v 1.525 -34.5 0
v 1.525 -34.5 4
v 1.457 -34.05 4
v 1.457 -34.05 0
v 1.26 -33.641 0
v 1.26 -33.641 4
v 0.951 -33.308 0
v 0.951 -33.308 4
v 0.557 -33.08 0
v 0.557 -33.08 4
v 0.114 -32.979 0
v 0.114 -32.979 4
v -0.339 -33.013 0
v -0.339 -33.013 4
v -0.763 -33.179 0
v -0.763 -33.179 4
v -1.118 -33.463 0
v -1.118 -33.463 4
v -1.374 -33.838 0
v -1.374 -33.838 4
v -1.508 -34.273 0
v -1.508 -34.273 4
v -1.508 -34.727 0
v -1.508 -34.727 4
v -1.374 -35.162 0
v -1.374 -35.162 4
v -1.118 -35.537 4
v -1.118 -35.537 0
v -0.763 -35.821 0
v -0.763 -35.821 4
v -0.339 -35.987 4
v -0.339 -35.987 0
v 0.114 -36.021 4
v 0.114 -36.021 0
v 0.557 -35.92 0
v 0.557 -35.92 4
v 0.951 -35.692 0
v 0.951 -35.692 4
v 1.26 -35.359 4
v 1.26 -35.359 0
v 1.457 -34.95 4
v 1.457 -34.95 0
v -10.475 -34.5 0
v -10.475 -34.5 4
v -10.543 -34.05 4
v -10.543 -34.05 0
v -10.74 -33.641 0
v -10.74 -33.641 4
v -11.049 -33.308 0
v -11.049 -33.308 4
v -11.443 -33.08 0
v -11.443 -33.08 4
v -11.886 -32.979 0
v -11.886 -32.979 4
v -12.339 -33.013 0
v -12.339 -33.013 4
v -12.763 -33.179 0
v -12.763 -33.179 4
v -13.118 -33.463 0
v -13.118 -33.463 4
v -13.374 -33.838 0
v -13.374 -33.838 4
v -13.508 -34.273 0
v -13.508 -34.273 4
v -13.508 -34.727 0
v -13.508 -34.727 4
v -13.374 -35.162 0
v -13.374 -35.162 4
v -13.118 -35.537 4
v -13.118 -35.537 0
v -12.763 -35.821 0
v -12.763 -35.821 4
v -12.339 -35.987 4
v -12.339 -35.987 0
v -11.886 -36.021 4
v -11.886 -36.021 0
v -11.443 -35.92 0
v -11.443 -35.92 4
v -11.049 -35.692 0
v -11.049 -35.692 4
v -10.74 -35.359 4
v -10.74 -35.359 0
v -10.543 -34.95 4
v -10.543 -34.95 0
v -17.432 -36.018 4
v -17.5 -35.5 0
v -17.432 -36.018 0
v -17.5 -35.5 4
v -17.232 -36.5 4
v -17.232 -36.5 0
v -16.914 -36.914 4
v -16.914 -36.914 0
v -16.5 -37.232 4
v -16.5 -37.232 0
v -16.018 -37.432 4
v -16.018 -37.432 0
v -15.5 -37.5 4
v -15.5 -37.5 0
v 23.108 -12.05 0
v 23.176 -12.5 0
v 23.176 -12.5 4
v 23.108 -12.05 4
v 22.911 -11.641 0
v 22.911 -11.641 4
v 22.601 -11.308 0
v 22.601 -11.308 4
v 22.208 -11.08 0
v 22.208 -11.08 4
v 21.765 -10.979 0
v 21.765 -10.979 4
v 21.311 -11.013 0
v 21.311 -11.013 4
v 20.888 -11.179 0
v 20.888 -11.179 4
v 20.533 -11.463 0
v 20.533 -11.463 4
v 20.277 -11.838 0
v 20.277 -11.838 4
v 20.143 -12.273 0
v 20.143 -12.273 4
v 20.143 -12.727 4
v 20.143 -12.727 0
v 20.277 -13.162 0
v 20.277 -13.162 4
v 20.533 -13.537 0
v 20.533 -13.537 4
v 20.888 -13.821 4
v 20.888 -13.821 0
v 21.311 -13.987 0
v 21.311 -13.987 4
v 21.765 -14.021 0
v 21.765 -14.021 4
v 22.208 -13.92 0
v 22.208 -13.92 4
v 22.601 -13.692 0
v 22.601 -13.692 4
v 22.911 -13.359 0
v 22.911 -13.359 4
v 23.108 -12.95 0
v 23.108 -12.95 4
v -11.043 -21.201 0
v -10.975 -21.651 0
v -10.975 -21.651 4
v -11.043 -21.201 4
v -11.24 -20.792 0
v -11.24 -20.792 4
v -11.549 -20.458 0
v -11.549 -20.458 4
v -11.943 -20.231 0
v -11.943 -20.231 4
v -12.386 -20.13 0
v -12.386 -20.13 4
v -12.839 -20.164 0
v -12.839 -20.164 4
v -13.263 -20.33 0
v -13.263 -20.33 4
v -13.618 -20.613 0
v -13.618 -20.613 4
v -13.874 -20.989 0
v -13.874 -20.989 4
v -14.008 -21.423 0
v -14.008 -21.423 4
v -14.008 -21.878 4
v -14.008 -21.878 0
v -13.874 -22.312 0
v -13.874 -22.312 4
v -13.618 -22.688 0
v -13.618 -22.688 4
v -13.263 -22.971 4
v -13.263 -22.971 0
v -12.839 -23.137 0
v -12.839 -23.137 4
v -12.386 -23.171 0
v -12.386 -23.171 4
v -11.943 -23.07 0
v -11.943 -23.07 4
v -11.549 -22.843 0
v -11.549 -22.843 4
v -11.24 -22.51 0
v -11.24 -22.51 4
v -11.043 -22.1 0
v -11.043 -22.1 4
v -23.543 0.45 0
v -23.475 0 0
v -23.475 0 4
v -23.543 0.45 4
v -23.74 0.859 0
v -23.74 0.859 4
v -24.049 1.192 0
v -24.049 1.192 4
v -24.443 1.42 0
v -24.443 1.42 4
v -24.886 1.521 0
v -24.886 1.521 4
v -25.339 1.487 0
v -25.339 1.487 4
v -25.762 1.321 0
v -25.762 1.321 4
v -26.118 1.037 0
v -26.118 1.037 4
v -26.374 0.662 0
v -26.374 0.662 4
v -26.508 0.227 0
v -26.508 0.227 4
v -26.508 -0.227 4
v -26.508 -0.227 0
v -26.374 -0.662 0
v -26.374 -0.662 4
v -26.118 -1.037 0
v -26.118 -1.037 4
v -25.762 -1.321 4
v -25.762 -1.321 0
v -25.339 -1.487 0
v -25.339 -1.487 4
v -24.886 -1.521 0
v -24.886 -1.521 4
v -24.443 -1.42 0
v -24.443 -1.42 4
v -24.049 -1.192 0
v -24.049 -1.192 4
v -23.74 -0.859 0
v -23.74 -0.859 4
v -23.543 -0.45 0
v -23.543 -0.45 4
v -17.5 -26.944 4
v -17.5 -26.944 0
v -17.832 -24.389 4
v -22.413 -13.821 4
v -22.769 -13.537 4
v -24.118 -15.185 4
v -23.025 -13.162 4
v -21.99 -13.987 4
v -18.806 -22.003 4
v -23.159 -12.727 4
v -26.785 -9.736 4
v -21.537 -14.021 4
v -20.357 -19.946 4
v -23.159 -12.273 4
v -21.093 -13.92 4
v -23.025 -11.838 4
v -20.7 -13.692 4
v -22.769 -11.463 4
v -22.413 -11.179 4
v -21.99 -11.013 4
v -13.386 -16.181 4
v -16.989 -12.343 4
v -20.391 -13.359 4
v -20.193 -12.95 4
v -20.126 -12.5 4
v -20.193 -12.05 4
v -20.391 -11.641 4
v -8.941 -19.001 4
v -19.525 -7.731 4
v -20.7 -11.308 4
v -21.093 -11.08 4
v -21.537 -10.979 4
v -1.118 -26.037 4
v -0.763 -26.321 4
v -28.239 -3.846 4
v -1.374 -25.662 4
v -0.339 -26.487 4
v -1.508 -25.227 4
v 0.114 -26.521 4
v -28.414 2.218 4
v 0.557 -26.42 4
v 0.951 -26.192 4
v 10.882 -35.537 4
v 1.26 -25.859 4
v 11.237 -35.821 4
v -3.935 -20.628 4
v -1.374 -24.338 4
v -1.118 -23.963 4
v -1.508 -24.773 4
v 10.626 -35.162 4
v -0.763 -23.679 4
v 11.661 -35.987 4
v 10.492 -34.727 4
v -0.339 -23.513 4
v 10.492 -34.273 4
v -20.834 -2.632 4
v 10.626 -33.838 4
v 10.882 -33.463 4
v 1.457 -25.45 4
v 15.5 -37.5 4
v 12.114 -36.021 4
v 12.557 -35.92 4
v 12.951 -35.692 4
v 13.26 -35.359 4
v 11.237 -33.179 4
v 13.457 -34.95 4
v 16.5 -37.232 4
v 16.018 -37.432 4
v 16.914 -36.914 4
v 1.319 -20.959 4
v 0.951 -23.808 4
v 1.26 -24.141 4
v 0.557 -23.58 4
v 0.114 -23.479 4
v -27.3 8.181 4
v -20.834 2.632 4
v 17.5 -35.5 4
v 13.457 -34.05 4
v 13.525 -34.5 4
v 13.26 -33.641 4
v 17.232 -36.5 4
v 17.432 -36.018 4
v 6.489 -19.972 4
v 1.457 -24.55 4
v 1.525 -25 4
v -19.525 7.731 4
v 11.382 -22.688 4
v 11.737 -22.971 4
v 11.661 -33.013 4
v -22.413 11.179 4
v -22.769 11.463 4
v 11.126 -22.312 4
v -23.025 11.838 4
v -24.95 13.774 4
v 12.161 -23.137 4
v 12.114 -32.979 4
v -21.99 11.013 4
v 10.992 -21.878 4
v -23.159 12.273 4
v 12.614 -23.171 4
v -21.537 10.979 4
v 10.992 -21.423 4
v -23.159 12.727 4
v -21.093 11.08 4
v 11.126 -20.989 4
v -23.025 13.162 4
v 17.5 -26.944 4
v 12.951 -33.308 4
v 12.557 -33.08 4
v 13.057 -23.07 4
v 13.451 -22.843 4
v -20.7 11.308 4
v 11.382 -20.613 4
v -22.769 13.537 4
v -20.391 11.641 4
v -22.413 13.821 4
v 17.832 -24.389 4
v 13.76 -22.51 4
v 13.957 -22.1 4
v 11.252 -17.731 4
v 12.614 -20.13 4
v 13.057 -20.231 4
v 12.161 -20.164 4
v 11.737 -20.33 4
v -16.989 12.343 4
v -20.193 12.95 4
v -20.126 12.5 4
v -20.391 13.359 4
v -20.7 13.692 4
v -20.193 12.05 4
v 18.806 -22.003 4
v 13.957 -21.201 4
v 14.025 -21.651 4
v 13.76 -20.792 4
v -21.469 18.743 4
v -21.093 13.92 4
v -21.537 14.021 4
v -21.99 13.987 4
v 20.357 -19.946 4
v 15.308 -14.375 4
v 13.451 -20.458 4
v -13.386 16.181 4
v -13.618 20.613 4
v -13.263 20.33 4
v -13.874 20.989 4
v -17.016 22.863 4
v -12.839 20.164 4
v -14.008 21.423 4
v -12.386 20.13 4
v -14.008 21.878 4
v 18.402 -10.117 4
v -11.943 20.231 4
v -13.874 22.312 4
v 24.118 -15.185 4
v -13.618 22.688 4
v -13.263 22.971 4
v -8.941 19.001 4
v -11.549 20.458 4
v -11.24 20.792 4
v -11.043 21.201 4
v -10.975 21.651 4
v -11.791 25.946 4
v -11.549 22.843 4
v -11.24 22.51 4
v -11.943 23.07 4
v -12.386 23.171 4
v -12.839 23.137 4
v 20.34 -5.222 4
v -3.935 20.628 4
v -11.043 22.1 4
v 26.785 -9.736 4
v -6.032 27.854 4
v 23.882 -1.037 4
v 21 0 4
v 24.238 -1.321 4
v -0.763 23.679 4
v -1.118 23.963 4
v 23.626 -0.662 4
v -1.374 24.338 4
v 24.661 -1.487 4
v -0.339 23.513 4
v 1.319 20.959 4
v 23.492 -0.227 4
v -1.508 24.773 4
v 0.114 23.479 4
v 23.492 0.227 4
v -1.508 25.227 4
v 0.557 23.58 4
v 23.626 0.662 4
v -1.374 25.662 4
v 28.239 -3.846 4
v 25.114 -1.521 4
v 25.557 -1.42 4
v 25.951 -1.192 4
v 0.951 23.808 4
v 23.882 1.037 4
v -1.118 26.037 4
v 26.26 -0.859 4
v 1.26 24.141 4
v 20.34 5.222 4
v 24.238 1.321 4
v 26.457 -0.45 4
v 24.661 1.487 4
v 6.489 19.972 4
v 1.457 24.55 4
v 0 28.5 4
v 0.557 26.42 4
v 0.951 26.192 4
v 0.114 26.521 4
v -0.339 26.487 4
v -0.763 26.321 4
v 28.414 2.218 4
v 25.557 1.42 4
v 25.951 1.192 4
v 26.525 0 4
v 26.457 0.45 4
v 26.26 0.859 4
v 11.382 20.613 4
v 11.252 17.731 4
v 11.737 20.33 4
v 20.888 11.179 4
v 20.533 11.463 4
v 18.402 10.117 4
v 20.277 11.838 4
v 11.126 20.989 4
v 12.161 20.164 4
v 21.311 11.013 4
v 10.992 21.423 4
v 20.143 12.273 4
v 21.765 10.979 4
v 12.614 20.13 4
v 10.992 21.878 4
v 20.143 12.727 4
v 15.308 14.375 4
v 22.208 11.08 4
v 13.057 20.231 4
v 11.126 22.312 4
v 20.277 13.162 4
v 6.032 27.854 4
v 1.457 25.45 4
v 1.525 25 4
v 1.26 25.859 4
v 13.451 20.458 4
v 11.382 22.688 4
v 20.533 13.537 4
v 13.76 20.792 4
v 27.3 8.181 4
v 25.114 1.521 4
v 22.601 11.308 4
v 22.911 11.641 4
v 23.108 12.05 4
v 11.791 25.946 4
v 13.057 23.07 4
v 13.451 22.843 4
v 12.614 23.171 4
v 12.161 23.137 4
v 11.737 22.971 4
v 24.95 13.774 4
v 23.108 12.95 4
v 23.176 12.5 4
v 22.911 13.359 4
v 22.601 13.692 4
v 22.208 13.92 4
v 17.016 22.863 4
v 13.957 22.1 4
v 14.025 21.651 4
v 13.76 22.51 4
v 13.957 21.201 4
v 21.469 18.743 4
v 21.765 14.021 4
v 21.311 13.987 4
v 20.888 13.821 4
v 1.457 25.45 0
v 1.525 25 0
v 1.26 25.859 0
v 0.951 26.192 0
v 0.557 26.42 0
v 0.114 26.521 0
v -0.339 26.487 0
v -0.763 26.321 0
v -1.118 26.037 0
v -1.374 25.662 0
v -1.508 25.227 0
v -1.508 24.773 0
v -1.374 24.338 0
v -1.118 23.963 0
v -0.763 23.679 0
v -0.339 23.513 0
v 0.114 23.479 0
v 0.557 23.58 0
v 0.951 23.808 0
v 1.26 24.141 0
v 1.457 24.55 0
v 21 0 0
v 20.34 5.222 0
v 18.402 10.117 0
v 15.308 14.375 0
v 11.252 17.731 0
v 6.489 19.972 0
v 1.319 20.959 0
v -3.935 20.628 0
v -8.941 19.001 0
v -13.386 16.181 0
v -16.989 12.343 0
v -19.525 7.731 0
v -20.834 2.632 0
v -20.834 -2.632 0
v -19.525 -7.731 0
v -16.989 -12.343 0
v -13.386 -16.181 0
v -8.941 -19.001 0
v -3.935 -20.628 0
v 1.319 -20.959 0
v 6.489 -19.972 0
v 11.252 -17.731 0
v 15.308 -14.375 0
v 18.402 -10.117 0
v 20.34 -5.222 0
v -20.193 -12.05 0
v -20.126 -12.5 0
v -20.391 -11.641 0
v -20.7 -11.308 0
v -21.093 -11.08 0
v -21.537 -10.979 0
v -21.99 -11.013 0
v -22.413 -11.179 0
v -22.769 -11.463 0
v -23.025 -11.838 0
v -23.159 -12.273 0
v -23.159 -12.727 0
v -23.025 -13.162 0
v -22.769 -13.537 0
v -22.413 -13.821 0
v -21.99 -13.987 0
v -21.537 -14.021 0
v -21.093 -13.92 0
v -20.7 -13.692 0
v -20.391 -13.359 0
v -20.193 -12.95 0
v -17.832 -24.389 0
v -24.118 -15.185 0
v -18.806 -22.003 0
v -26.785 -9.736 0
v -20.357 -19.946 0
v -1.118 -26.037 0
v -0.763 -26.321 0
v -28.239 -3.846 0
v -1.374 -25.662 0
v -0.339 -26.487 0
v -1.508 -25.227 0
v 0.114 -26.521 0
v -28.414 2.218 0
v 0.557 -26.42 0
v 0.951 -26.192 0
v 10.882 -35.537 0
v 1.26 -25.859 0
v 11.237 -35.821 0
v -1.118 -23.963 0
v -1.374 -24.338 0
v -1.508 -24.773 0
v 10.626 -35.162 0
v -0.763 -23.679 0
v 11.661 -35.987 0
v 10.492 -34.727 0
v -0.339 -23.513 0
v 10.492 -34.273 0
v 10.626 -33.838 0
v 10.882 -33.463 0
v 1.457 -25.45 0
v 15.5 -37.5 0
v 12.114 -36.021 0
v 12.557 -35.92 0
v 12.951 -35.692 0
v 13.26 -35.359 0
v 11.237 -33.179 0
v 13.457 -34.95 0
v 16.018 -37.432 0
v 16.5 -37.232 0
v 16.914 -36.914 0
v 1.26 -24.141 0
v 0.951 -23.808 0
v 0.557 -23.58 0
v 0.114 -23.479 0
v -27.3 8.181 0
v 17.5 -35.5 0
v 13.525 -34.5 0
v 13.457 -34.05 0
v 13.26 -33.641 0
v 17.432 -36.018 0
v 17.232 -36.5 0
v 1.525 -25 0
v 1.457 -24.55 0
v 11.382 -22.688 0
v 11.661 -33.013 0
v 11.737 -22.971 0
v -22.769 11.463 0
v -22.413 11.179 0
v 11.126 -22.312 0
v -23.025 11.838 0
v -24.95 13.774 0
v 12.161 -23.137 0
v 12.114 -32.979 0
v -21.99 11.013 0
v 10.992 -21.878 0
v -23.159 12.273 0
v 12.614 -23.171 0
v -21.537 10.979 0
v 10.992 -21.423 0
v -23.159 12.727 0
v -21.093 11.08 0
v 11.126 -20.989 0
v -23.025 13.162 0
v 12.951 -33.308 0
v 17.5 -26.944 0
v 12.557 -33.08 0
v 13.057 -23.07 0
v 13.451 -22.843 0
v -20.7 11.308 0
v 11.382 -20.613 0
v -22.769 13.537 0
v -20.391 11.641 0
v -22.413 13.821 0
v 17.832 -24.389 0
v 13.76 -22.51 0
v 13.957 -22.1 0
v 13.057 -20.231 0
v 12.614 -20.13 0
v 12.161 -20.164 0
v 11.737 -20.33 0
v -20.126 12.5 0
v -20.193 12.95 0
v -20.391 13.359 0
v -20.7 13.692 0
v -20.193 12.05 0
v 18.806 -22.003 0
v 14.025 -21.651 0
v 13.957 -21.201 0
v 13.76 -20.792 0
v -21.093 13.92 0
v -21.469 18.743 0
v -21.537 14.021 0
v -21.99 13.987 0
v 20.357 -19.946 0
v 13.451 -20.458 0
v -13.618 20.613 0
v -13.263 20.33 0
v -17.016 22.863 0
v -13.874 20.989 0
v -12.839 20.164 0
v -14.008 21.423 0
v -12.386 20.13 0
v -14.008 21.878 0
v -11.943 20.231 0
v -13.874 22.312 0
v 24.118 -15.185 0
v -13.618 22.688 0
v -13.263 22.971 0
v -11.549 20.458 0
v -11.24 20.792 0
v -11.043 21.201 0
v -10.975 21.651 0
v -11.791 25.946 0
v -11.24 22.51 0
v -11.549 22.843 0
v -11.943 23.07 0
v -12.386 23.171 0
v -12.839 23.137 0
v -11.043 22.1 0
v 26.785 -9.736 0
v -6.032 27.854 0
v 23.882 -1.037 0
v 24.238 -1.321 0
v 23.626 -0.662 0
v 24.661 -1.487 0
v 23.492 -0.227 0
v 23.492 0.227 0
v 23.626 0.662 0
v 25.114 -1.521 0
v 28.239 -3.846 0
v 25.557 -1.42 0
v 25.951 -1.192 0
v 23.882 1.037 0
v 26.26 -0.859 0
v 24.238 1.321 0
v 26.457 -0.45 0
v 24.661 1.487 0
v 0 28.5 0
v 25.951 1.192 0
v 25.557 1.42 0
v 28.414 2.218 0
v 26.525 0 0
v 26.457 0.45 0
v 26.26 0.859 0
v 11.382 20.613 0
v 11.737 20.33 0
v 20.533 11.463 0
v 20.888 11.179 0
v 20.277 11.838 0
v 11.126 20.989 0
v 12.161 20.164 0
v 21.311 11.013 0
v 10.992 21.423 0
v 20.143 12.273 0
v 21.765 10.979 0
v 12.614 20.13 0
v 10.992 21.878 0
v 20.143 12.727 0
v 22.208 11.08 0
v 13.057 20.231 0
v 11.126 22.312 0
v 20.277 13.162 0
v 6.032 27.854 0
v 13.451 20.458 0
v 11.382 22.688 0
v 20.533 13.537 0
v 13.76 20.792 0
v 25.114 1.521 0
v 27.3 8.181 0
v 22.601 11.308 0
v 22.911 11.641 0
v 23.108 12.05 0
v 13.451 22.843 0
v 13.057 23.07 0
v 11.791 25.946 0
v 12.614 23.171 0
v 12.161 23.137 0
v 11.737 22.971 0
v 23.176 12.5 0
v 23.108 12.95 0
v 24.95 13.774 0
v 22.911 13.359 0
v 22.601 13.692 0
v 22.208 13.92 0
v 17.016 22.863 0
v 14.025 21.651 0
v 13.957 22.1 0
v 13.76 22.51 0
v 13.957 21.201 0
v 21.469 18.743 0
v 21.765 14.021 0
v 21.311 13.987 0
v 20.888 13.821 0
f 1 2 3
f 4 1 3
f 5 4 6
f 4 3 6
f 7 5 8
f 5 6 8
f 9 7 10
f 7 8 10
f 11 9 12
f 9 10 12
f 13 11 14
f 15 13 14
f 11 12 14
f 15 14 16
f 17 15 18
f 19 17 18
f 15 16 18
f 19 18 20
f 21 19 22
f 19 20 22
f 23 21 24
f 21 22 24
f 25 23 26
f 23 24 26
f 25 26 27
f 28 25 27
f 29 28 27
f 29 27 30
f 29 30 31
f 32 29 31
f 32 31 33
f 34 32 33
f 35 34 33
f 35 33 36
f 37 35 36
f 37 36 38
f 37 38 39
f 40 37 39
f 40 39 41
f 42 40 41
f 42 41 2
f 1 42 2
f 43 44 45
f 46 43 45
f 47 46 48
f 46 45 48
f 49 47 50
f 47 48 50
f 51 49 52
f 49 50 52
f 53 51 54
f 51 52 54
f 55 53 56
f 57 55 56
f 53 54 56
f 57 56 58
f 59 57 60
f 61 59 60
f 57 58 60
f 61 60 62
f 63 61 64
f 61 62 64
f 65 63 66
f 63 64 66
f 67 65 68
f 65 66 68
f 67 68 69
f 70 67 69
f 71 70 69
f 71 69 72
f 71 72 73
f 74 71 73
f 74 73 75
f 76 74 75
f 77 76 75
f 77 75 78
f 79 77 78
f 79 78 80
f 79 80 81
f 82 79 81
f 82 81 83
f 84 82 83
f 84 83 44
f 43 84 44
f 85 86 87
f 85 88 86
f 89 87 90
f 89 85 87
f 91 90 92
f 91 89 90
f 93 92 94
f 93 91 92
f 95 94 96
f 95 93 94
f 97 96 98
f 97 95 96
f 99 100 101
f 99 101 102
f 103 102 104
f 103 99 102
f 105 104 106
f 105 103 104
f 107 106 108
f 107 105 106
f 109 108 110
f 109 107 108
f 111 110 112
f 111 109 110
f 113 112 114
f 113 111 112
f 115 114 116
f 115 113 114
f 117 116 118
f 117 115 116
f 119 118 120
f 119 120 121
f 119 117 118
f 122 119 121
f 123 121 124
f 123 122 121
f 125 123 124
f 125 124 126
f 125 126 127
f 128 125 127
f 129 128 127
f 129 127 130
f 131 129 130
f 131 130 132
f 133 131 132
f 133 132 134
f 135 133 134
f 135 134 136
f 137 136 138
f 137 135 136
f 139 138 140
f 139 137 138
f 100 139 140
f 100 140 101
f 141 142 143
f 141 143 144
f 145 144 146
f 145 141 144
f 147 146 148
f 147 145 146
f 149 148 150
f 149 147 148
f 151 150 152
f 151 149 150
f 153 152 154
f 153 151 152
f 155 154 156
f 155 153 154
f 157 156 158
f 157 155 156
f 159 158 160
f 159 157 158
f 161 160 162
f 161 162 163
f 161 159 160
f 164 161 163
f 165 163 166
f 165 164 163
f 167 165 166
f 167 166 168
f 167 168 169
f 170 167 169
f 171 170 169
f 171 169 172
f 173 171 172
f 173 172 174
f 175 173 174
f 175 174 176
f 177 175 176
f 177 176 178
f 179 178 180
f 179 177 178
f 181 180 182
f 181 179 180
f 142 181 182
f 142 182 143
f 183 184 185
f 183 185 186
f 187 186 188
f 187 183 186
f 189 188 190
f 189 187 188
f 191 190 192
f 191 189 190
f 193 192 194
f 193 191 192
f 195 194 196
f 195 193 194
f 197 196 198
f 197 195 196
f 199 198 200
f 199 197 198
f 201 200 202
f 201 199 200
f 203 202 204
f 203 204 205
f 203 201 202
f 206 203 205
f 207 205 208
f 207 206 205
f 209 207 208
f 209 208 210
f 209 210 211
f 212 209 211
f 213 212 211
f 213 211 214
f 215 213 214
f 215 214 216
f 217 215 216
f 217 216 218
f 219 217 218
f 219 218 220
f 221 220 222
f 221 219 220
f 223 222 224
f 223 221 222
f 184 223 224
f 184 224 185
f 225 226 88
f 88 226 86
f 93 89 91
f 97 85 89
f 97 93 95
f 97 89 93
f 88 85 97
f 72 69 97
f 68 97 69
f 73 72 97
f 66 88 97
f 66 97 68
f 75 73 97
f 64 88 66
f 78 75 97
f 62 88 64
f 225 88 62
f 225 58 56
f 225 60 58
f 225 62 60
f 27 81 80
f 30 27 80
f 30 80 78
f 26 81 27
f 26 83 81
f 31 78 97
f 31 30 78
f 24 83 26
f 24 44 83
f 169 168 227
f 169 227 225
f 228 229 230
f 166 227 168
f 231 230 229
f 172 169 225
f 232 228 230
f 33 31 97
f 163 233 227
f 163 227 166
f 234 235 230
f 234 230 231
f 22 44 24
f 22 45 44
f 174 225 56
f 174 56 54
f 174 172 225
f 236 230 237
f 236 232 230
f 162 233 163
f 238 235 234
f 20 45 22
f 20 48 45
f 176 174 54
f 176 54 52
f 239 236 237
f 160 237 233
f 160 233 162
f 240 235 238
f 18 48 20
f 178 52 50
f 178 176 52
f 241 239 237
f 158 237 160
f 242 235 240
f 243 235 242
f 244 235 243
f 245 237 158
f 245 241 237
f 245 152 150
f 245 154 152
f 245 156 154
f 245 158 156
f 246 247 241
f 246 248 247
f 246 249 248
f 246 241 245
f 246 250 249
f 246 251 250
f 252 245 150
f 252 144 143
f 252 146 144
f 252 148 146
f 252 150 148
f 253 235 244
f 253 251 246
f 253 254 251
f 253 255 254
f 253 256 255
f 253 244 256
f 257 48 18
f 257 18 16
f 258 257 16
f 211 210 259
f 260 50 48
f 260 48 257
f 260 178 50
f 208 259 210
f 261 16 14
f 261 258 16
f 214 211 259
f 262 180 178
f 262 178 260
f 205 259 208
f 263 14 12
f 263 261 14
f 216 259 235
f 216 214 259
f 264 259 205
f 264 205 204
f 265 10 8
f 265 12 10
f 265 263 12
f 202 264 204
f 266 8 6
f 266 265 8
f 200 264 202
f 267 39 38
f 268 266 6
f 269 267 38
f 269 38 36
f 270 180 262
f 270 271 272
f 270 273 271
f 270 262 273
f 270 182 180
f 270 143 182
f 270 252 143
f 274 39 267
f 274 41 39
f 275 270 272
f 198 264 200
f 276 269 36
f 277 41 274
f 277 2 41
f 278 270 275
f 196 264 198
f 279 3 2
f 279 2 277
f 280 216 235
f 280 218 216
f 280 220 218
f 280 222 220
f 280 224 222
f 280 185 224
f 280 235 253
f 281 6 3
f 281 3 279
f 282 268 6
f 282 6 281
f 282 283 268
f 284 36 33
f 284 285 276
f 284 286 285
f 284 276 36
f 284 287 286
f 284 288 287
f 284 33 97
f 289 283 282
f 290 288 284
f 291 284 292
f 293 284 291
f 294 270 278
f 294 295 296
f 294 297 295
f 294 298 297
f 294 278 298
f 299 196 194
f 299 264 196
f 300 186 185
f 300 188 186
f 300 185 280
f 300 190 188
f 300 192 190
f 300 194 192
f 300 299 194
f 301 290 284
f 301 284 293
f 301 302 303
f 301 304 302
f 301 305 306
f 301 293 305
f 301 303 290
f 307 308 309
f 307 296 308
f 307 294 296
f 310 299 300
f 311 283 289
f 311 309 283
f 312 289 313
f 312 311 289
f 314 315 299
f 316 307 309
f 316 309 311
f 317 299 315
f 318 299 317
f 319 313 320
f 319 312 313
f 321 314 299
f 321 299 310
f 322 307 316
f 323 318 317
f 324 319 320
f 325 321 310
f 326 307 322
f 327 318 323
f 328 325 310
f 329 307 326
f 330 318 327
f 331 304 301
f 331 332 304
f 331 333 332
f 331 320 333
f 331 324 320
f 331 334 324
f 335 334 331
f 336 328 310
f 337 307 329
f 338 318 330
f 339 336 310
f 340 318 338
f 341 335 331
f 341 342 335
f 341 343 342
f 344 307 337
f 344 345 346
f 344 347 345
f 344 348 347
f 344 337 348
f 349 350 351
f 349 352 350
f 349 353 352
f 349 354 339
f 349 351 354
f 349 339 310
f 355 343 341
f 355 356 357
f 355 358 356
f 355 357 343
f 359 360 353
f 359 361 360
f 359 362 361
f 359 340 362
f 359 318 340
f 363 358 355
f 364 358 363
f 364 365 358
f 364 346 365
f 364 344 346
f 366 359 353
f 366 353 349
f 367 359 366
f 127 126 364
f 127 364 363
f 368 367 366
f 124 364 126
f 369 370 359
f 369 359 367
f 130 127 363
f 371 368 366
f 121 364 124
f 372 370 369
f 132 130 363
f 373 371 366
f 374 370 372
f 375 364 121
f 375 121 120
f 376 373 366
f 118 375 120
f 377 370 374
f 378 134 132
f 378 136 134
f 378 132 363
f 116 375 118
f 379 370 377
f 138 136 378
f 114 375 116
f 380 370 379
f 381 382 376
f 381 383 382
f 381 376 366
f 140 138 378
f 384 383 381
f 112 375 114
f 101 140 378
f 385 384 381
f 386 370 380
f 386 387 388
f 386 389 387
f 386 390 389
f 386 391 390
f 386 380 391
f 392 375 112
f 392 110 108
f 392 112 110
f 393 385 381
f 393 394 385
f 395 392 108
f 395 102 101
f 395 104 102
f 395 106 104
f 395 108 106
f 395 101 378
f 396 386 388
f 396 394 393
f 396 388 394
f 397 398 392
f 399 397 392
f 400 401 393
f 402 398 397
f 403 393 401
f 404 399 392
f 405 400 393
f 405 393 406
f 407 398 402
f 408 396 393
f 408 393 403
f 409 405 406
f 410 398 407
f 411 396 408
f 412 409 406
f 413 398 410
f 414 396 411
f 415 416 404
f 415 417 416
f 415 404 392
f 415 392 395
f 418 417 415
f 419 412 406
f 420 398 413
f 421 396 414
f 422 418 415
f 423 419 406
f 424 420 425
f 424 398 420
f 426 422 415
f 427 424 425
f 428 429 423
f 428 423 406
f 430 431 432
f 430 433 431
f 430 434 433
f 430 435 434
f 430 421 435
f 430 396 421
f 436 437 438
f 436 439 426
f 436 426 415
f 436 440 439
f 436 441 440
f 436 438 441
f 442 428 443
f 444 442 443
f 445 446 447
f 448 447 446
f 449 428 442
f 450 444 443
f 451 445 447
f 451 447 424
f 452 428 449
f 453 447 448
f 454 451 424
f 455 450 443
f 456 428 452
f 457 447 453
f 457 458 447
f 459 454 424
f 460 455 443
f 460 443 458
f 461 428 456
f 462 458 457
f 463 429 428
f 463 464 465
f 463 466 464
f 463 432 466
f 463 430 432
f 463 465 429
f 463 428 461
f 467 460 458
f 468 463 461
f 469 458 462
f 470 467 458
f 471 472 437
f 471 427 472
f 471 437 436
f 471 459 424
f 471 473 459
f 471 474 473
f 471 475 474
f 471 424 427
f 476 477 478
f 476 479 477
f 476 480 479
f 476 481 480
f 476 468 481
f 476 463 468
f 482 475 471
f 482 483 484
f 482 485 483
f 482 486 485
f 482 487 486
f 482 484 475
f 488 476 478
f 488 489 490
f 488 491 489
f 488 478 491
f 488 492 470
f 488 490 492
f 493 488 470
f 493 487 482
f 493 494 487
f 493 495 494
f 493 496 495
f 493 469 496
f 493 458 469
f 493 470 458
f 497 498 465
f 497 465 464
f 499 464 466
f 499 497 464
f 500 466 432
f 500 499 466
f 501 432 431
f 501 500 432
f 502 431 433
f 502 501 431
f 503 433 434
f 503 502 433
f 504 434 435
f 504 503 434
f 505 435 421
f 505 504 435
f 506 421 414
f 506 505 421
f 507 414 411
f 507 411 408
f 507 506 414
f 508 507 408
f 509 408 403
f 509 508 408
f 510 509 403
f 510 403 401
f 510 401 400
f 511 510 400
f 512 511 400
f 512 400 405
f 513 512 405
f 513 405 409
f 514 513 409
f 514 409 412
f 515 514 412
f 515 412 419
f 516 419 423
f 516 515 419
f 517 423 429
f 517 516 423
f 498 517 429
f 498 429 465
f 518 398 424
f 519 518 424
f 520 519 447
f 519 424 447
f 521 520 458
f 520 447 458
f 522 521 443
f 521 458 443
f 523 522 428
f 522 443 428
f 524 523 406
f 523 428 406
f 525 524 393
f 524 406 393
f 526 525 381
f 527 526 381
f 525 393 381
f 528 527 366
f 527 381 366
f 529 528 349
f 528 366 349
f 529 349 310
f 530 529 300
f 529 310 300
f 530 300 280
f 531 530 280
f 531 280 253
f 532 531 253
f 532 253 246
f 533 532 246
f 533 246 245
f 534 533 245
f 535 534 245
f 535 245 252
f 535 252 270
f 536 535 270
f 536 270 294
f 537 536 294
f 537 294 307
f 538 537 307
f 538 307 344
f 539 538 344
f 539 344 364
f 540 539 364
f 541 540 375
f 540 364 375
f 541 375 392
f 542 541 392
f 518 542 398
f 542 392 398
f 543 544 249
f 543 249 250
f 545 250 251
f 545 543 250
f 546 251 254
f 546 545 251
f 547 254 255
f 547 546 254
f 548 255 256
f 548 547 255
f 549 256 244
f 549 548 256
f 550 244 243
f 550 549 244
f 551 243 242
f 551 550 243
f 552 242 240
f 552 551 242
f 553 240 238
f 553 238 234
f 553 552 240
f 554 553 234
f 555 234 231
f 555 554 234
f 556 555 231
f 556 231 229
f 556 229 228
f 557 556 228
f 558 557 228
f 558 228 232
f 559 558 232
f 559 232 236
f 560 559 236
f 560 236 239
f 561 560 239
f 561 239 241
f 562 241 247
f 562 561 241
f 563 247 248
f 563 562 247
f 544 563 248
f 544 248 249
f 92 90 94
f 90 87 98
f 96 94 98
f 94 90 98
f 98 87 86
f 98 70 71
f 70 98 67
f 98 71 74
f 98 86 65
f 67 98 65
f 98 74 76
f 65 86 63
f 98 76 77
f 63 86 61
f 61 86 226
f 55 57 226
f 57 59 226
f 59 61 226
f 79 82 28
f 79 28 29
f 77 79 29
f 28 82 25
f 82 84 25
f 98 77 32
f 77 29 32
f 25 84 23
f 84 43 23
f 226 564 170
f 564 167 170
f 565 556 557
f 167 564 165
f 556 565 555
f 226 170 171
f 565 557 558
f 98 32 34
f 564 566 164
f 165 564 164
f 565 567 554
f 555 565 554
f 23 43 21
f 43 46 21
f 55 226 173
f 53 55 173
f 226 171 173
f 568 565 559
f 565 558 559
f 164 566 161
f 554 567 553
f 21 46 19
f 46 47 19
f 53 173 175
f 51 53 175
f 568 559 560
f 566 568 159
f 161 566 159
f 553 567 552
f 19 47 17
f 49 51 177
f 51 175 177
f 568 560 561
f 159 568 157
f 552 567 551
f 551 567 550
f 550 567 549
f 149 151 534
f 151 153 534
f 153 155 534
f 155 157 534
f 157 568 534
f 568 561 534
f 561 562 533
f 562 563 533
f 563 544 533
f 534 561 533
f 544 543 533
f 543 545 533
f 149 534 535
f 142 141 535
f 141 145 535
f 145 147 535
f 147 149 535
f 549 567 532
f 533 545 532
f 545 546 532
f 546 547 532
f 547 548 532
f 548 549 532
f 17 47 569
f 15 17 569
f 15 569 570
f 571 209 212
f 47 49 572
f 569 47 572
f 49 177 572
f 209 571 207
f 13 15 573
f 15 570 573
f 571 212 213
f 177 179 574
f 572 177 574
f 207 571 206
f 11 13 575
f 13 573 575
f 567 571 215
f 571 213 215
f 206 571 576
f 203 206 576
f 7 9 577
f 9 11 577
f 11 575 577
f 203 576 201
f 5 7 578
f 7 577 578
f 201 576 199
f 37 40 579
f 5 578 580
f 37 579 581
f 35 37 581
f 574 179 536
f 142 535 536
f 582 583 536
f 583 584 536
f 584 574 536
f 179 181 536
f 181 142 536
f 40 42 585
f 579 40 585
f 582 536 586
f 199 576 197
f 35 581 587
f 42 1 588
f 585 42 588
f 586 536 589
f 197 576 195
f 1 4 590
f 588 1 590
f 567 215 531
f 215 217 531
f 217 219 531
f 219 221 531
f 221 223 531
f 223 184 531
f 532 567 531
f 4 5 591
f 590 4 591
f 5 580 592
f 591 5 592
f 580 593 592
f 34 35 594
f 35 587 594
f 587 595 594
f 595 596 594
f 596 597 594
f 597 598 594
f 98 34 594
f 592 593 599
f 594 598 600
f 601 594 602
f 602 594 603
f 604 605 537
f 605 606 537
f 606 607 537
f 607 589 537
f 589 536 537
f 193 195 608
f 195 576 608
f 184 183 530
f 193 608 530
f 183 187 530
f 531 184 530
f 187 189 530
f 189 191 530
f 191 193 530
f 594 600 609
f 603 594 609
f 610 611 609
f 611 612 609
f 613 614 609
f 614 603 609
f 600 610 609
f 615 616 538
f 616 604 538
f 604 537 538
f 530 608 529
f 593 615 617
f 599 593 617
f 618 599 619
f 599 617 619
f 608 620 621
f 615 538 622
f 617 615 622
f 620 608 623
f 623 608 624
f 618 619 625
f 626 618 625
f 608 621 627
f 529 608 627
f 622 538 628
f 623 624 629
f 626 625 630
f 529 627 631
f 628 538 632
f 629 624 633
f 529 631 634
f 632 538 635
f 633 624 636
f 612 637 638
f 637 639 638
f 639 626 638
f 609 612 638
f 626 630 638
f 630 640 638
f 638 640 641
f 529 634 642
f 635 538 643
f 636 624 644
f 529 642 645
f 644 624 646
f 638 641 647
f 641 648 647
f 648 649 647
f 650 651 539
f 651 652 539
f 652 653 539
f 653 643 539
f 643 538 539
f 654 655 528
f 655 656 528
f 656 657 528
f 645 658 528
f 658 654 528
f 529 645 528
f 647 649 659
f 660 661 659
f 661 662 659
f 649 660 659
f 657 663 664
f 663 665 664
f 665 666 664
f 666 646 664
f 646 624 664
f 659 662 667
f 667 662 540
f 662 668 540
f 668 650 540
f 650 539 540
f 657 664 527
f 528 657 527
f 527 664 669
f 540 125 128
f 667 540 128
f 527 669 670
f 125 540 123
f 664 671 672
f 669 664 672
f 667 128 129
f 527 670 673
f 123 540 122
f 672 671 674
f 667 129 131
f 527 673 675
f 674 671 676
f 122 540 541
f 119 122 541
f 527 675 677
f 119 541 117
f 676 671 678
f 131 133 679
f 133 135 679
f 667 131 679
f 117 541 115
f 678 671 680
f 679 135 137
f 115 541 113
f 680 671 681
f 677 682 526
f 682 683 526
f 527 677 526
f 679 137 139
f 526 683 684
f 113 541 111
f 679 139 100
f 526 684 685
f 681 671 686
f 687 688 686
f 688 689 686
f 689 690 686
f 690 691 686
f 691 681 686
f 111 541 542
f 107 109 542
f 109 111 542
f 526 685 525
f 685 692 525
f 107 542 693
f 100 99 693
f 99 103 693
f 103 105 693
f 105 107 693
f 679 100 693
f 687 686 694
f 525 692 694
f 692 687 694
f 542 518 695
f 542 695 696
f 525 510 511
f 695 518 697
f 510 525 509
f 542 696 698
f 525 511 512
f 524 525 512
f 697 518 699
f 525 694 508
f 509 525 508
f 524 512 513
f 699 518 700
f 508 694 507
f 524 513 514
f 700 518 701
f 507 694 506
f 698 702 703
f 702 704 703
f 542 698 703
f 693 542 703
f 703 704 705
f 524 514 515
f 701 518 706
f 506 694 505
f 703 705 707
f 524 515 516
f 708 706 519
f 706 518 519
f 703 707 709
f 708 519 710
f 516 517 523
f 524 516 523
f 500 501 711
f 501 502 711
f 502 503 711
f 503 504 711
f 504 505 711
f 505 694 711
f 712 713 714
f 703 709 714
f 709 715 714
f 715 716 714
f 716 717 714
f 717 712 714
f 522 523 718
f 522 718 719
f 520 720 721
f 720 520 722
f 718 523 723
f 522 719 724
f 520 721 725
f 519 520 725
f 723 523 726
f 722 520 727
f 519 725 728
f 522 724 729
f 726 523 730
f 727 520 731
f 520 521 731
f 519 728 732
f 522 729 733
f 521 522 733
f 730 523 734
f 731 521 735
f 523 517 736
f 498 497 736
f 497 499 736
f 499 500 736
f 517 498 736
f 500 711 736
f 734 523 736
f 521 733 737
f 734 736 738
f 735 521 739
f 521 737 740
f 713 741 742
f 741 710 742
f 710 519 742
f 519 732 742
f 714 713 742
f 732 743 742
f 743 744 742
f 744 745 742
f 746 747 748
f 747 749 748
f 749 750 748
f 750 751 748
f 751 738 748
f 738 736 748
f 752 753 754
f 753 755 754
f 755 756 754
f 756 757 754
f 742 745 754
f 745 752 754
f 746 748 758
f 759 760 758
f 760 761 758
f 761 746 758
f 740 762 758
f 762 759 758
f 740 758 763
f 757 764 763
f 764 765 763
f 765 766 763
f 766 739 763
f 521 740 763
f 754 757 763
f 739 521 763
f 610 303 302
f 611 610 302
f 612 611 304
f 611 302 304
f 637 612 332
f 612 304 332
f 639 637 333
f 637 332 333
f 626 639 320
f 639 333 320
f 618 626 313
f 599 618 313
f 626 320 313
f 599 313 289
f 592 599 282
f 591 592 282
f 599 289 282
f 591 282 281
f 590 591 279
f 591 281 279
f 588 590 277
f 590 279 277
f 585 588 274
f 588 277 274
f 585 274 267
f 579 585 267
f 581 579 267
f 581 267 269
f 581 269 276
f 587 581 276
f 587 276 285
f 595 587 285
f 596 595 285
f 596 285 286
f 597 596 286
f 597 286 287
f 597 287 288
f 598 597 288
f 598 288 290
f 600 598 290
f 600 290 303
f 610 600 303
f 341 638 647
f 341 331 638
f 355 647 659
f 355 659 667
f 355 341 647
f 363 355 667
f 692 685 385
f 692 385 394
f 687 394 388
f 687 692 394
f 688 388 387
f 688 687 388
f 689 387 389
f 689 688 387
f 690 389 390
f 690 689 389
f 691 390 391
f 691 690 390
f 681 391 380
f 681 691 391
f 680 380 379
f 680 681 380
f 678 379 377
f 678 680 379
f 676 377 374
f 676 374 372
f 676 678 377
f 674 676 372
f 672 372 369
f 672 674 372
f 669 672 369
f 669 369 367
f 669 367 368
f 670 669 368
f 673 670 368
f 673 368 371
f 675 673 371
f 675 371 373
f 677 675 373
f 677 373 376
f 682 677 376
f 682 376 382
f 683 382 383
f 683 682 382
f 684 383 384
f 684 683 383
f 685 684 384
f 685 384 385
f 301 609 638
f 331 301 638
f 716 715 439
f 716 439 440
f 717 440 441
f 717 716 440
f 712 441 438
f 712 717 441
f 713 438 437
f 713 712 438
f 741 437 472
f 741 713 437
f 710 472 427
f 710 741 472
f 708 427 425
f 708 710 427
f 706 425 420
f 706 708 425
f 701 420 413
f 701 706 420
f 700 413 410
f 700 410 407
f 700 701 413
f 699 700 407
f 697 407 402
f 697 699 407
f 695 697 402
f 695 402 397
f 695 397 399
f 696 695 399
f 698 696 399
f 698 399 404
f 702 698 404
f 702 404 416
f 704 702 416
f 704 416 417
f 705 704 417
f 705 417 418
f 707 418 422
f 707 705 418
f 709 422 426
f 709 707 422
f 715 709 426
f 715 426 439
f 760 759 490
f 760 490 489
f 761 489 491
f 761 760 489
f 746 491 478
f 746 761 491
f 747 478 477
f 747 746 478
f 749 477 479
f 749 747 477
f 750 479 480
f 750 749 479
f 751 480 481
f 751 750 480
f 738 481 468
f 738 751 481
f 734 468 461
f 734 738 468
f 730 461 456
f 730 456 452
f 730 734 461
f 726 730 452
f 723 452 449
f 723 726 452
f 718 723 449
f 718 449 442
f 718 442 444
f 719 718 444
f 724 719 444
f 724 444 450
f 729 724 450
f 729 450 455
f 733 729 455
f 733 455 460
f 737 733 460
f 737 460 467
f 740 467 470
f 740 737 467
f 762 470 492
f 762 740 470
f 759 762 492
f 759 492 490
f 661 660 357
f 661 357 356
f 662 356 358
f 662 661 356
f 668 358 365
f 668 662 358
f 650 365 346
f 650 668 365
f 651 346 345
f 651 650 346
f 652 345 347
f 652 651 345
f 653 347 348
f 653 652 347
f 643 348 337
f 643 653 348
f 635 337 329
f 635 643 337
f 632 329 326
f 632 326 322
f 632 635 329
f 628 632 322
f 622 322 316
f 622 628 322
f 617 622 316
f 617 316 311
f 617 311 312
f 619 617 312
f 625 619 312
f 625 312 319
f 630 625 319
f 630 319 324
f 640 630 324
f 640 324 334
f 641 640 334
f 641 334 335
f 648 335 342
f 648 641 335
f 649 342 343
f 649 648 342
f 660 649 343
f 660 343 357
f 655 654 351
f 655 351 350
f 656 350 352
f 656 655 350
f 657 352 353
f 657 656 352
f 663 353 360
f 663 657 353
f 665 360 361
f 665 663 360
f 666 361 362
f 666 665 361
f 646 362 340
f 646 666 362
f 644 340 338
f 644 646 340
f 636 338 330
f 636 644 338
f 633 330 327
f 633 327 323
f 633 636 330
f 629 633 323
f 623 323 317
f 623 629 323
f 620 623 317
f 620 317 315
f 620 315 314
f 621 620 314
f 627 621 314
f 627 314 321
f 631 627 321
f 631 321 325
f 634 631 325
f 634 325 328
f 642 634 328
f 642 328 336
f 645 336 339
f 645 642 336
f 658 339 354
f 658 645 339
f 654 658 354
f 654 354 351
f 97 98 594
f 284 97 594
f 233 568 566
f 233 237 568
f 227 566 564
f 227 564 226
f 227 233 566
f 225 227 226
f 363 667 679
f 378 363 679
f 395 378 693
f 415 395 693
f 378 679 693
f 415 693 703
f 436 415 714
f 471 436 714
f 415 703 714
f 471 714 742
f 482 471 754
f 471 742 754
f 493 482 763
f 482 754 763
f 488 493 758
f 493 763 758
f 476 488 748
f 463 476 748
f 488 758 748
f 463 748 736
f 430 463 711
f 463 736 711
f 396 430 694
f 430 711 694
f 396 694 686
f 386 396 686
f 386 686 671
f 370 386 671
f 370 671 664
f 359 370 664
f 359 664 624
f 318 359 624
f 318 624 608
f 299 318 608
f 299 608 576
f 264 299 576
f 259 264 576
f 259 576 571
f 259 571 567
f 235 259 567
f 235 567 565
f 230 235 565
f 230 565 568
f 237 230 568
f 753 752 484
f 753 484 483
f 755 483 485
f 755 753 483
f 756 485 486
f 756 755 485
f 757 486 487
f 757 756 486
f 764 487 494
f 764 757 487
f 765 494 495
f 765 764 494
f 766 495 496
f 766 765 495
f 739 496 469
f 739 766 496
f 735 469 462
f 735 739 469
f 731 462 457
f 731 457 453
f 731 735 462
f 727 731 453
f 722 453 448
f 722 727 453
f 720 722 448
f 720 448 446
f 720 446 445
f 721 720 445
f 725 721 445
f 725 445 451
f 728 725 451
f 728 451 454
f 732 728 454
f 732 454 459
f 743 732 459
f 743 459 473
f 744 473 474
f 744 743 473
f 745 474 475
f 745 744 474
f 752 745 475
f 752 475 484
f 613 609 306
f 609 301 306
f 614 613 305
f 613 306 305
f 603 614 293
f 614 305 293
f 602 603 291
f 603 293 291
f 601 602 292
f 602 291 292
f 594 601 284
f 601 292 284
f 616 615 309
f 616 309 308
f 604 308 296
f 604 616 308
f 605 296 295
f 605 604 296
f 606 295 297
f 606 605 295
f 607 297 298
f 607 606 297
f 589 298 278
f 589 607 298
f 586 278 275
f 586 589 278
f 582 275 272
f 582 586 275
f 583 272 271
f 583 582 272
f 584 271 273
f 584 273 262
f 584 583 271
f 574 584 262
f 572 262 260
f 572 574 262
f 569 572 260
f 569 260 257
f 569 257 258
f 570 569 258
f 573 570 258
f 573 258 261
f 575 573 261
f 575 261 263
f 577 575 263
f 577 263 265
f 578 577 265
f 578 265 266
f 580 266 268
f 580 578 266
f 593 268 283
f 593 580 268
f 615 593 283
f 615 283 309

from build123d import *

# Parameters (mm, degrees)
SKETCH_2_R          = 1.525
EXTRUDE_1_DEPTH     = 4
SKETCH_4_R          = 21
CUT_EXTRUDE_1_DEPTH = 5
SKETCH_5_R          = 1.525
CUT_EXTRUDE_2_DEPTH = 5
FILLET_1_R          = 2
FILLET_2_R          = 10


with BuildPart() as part:
    # 草图2 → 凸台-拉伸1 (new body)
    with BuildSketch(Plane.XY):
        with BuildLine():
            ThreePointArc((17.5, -22.494443758), (0, 28.5), (-17.5, -22.494443758))
            Line((-17.5, -22.494443758), (-17.5, -37.5))
            Line((-17.5, -37.5), (17.5, -37.5))
            Line((17.5, -37.5), (17.5, -22.494443758))
        make_face()
        with Locations((-12.5, -21.650635095)):
            Circle(SKETCH_2_R, mode=Mode.SUBTRACT)
        with Locations((12.5, -21.650635095)):
            Circle(SKETCH_2_R, mode=Mode.SUBTRACT)
        with Locations((-21.650635095, -12.5)):
            Circle(SKETCH_2_R, mode=Mode.SUBTRACT)
        with Locations((21.650635095, -12.5)):
            Circle(SKETCH_2_R, mode=Mode.SUBTRACT)
        with Locations((-25, 0)):
            Circle(SKETCH_2_R, mode=Mode.SUBTRACT)
        with Locations((-21.650635095, 12.5)):
            Circle(SKETCH_2_R, mode=Mode.SUBTRACT)
        with Locations((-12.5, 21.650635095)):
            Circle(SKETCH_2_R, mode=Mode.SUBTRACT)
        with Locations((25, 0)):
            Circle(SKETCH_2_R, mode=Mode.SUBTRACT)
        with Locations((0, 25)):
            Circle(SKETCH_2_R, mode=Mode.SUBTRACT)
        with Locations((12.5, 21.650635095)):
            Circle(SKETCH_2_R, mode=Mode.SUBTRACT)
        with Locations((21.650635095, 12.5)):
            Circle(SKETCH_2_R, mode=Mode.SUBTRACT)
        with Locations((0, -25)):
            Circle(SKETCH_2_R, mode=Mode.SUBTRACT)
    extrude(amount=EXTRUDE_1_DEPTH)

    # 草图4 → 切除-拉伸1 (cut, through all)
    with BuildSketch(Plane.XY.offset(4)):
        Circle(SKETCH_4_R)
    extrude(amount=-CUT_EXTRUDE_1_DEPTH, mode=Mode.SUBTRACT)

    # 草图5 → 切除-拉伸2 (cut, through all)
    with BuildSketch(Plane.XY.offset(4)):
        with Locations((0, -34.5)):
            Circle(SKETCH_5_R)
        with Locations((12, -34.5)):
            Circle(SKETCH_5_R)
        with Locations((-12, -34.5)):
            Circle(SKETCH_5_R)
    extrude(amount=-CUT_EXTRUDE_2_DEPTH, mode=Mode.SUBTRACT)

    # 圆角1
    fillet_1_edges = [part.edges().sort_by_distance(p)[0] for p in [
        (17.5, -37.5, 2),
        (-17.5, -37.5, 2),
    ]]
    fillet(fillet_1_edges, radius=FILLET_1_R)

    # 圆角2
    fillet_2_edges = [part.edges().sort_by_distance(p)[0] for p in [
        (17.5, -22.494443758, 2),
        (-17.5, -22.494443758, 2),
    ]]
    fillet(fillet_2_edges, radius=FILLET_2_R)


solid = part.part
